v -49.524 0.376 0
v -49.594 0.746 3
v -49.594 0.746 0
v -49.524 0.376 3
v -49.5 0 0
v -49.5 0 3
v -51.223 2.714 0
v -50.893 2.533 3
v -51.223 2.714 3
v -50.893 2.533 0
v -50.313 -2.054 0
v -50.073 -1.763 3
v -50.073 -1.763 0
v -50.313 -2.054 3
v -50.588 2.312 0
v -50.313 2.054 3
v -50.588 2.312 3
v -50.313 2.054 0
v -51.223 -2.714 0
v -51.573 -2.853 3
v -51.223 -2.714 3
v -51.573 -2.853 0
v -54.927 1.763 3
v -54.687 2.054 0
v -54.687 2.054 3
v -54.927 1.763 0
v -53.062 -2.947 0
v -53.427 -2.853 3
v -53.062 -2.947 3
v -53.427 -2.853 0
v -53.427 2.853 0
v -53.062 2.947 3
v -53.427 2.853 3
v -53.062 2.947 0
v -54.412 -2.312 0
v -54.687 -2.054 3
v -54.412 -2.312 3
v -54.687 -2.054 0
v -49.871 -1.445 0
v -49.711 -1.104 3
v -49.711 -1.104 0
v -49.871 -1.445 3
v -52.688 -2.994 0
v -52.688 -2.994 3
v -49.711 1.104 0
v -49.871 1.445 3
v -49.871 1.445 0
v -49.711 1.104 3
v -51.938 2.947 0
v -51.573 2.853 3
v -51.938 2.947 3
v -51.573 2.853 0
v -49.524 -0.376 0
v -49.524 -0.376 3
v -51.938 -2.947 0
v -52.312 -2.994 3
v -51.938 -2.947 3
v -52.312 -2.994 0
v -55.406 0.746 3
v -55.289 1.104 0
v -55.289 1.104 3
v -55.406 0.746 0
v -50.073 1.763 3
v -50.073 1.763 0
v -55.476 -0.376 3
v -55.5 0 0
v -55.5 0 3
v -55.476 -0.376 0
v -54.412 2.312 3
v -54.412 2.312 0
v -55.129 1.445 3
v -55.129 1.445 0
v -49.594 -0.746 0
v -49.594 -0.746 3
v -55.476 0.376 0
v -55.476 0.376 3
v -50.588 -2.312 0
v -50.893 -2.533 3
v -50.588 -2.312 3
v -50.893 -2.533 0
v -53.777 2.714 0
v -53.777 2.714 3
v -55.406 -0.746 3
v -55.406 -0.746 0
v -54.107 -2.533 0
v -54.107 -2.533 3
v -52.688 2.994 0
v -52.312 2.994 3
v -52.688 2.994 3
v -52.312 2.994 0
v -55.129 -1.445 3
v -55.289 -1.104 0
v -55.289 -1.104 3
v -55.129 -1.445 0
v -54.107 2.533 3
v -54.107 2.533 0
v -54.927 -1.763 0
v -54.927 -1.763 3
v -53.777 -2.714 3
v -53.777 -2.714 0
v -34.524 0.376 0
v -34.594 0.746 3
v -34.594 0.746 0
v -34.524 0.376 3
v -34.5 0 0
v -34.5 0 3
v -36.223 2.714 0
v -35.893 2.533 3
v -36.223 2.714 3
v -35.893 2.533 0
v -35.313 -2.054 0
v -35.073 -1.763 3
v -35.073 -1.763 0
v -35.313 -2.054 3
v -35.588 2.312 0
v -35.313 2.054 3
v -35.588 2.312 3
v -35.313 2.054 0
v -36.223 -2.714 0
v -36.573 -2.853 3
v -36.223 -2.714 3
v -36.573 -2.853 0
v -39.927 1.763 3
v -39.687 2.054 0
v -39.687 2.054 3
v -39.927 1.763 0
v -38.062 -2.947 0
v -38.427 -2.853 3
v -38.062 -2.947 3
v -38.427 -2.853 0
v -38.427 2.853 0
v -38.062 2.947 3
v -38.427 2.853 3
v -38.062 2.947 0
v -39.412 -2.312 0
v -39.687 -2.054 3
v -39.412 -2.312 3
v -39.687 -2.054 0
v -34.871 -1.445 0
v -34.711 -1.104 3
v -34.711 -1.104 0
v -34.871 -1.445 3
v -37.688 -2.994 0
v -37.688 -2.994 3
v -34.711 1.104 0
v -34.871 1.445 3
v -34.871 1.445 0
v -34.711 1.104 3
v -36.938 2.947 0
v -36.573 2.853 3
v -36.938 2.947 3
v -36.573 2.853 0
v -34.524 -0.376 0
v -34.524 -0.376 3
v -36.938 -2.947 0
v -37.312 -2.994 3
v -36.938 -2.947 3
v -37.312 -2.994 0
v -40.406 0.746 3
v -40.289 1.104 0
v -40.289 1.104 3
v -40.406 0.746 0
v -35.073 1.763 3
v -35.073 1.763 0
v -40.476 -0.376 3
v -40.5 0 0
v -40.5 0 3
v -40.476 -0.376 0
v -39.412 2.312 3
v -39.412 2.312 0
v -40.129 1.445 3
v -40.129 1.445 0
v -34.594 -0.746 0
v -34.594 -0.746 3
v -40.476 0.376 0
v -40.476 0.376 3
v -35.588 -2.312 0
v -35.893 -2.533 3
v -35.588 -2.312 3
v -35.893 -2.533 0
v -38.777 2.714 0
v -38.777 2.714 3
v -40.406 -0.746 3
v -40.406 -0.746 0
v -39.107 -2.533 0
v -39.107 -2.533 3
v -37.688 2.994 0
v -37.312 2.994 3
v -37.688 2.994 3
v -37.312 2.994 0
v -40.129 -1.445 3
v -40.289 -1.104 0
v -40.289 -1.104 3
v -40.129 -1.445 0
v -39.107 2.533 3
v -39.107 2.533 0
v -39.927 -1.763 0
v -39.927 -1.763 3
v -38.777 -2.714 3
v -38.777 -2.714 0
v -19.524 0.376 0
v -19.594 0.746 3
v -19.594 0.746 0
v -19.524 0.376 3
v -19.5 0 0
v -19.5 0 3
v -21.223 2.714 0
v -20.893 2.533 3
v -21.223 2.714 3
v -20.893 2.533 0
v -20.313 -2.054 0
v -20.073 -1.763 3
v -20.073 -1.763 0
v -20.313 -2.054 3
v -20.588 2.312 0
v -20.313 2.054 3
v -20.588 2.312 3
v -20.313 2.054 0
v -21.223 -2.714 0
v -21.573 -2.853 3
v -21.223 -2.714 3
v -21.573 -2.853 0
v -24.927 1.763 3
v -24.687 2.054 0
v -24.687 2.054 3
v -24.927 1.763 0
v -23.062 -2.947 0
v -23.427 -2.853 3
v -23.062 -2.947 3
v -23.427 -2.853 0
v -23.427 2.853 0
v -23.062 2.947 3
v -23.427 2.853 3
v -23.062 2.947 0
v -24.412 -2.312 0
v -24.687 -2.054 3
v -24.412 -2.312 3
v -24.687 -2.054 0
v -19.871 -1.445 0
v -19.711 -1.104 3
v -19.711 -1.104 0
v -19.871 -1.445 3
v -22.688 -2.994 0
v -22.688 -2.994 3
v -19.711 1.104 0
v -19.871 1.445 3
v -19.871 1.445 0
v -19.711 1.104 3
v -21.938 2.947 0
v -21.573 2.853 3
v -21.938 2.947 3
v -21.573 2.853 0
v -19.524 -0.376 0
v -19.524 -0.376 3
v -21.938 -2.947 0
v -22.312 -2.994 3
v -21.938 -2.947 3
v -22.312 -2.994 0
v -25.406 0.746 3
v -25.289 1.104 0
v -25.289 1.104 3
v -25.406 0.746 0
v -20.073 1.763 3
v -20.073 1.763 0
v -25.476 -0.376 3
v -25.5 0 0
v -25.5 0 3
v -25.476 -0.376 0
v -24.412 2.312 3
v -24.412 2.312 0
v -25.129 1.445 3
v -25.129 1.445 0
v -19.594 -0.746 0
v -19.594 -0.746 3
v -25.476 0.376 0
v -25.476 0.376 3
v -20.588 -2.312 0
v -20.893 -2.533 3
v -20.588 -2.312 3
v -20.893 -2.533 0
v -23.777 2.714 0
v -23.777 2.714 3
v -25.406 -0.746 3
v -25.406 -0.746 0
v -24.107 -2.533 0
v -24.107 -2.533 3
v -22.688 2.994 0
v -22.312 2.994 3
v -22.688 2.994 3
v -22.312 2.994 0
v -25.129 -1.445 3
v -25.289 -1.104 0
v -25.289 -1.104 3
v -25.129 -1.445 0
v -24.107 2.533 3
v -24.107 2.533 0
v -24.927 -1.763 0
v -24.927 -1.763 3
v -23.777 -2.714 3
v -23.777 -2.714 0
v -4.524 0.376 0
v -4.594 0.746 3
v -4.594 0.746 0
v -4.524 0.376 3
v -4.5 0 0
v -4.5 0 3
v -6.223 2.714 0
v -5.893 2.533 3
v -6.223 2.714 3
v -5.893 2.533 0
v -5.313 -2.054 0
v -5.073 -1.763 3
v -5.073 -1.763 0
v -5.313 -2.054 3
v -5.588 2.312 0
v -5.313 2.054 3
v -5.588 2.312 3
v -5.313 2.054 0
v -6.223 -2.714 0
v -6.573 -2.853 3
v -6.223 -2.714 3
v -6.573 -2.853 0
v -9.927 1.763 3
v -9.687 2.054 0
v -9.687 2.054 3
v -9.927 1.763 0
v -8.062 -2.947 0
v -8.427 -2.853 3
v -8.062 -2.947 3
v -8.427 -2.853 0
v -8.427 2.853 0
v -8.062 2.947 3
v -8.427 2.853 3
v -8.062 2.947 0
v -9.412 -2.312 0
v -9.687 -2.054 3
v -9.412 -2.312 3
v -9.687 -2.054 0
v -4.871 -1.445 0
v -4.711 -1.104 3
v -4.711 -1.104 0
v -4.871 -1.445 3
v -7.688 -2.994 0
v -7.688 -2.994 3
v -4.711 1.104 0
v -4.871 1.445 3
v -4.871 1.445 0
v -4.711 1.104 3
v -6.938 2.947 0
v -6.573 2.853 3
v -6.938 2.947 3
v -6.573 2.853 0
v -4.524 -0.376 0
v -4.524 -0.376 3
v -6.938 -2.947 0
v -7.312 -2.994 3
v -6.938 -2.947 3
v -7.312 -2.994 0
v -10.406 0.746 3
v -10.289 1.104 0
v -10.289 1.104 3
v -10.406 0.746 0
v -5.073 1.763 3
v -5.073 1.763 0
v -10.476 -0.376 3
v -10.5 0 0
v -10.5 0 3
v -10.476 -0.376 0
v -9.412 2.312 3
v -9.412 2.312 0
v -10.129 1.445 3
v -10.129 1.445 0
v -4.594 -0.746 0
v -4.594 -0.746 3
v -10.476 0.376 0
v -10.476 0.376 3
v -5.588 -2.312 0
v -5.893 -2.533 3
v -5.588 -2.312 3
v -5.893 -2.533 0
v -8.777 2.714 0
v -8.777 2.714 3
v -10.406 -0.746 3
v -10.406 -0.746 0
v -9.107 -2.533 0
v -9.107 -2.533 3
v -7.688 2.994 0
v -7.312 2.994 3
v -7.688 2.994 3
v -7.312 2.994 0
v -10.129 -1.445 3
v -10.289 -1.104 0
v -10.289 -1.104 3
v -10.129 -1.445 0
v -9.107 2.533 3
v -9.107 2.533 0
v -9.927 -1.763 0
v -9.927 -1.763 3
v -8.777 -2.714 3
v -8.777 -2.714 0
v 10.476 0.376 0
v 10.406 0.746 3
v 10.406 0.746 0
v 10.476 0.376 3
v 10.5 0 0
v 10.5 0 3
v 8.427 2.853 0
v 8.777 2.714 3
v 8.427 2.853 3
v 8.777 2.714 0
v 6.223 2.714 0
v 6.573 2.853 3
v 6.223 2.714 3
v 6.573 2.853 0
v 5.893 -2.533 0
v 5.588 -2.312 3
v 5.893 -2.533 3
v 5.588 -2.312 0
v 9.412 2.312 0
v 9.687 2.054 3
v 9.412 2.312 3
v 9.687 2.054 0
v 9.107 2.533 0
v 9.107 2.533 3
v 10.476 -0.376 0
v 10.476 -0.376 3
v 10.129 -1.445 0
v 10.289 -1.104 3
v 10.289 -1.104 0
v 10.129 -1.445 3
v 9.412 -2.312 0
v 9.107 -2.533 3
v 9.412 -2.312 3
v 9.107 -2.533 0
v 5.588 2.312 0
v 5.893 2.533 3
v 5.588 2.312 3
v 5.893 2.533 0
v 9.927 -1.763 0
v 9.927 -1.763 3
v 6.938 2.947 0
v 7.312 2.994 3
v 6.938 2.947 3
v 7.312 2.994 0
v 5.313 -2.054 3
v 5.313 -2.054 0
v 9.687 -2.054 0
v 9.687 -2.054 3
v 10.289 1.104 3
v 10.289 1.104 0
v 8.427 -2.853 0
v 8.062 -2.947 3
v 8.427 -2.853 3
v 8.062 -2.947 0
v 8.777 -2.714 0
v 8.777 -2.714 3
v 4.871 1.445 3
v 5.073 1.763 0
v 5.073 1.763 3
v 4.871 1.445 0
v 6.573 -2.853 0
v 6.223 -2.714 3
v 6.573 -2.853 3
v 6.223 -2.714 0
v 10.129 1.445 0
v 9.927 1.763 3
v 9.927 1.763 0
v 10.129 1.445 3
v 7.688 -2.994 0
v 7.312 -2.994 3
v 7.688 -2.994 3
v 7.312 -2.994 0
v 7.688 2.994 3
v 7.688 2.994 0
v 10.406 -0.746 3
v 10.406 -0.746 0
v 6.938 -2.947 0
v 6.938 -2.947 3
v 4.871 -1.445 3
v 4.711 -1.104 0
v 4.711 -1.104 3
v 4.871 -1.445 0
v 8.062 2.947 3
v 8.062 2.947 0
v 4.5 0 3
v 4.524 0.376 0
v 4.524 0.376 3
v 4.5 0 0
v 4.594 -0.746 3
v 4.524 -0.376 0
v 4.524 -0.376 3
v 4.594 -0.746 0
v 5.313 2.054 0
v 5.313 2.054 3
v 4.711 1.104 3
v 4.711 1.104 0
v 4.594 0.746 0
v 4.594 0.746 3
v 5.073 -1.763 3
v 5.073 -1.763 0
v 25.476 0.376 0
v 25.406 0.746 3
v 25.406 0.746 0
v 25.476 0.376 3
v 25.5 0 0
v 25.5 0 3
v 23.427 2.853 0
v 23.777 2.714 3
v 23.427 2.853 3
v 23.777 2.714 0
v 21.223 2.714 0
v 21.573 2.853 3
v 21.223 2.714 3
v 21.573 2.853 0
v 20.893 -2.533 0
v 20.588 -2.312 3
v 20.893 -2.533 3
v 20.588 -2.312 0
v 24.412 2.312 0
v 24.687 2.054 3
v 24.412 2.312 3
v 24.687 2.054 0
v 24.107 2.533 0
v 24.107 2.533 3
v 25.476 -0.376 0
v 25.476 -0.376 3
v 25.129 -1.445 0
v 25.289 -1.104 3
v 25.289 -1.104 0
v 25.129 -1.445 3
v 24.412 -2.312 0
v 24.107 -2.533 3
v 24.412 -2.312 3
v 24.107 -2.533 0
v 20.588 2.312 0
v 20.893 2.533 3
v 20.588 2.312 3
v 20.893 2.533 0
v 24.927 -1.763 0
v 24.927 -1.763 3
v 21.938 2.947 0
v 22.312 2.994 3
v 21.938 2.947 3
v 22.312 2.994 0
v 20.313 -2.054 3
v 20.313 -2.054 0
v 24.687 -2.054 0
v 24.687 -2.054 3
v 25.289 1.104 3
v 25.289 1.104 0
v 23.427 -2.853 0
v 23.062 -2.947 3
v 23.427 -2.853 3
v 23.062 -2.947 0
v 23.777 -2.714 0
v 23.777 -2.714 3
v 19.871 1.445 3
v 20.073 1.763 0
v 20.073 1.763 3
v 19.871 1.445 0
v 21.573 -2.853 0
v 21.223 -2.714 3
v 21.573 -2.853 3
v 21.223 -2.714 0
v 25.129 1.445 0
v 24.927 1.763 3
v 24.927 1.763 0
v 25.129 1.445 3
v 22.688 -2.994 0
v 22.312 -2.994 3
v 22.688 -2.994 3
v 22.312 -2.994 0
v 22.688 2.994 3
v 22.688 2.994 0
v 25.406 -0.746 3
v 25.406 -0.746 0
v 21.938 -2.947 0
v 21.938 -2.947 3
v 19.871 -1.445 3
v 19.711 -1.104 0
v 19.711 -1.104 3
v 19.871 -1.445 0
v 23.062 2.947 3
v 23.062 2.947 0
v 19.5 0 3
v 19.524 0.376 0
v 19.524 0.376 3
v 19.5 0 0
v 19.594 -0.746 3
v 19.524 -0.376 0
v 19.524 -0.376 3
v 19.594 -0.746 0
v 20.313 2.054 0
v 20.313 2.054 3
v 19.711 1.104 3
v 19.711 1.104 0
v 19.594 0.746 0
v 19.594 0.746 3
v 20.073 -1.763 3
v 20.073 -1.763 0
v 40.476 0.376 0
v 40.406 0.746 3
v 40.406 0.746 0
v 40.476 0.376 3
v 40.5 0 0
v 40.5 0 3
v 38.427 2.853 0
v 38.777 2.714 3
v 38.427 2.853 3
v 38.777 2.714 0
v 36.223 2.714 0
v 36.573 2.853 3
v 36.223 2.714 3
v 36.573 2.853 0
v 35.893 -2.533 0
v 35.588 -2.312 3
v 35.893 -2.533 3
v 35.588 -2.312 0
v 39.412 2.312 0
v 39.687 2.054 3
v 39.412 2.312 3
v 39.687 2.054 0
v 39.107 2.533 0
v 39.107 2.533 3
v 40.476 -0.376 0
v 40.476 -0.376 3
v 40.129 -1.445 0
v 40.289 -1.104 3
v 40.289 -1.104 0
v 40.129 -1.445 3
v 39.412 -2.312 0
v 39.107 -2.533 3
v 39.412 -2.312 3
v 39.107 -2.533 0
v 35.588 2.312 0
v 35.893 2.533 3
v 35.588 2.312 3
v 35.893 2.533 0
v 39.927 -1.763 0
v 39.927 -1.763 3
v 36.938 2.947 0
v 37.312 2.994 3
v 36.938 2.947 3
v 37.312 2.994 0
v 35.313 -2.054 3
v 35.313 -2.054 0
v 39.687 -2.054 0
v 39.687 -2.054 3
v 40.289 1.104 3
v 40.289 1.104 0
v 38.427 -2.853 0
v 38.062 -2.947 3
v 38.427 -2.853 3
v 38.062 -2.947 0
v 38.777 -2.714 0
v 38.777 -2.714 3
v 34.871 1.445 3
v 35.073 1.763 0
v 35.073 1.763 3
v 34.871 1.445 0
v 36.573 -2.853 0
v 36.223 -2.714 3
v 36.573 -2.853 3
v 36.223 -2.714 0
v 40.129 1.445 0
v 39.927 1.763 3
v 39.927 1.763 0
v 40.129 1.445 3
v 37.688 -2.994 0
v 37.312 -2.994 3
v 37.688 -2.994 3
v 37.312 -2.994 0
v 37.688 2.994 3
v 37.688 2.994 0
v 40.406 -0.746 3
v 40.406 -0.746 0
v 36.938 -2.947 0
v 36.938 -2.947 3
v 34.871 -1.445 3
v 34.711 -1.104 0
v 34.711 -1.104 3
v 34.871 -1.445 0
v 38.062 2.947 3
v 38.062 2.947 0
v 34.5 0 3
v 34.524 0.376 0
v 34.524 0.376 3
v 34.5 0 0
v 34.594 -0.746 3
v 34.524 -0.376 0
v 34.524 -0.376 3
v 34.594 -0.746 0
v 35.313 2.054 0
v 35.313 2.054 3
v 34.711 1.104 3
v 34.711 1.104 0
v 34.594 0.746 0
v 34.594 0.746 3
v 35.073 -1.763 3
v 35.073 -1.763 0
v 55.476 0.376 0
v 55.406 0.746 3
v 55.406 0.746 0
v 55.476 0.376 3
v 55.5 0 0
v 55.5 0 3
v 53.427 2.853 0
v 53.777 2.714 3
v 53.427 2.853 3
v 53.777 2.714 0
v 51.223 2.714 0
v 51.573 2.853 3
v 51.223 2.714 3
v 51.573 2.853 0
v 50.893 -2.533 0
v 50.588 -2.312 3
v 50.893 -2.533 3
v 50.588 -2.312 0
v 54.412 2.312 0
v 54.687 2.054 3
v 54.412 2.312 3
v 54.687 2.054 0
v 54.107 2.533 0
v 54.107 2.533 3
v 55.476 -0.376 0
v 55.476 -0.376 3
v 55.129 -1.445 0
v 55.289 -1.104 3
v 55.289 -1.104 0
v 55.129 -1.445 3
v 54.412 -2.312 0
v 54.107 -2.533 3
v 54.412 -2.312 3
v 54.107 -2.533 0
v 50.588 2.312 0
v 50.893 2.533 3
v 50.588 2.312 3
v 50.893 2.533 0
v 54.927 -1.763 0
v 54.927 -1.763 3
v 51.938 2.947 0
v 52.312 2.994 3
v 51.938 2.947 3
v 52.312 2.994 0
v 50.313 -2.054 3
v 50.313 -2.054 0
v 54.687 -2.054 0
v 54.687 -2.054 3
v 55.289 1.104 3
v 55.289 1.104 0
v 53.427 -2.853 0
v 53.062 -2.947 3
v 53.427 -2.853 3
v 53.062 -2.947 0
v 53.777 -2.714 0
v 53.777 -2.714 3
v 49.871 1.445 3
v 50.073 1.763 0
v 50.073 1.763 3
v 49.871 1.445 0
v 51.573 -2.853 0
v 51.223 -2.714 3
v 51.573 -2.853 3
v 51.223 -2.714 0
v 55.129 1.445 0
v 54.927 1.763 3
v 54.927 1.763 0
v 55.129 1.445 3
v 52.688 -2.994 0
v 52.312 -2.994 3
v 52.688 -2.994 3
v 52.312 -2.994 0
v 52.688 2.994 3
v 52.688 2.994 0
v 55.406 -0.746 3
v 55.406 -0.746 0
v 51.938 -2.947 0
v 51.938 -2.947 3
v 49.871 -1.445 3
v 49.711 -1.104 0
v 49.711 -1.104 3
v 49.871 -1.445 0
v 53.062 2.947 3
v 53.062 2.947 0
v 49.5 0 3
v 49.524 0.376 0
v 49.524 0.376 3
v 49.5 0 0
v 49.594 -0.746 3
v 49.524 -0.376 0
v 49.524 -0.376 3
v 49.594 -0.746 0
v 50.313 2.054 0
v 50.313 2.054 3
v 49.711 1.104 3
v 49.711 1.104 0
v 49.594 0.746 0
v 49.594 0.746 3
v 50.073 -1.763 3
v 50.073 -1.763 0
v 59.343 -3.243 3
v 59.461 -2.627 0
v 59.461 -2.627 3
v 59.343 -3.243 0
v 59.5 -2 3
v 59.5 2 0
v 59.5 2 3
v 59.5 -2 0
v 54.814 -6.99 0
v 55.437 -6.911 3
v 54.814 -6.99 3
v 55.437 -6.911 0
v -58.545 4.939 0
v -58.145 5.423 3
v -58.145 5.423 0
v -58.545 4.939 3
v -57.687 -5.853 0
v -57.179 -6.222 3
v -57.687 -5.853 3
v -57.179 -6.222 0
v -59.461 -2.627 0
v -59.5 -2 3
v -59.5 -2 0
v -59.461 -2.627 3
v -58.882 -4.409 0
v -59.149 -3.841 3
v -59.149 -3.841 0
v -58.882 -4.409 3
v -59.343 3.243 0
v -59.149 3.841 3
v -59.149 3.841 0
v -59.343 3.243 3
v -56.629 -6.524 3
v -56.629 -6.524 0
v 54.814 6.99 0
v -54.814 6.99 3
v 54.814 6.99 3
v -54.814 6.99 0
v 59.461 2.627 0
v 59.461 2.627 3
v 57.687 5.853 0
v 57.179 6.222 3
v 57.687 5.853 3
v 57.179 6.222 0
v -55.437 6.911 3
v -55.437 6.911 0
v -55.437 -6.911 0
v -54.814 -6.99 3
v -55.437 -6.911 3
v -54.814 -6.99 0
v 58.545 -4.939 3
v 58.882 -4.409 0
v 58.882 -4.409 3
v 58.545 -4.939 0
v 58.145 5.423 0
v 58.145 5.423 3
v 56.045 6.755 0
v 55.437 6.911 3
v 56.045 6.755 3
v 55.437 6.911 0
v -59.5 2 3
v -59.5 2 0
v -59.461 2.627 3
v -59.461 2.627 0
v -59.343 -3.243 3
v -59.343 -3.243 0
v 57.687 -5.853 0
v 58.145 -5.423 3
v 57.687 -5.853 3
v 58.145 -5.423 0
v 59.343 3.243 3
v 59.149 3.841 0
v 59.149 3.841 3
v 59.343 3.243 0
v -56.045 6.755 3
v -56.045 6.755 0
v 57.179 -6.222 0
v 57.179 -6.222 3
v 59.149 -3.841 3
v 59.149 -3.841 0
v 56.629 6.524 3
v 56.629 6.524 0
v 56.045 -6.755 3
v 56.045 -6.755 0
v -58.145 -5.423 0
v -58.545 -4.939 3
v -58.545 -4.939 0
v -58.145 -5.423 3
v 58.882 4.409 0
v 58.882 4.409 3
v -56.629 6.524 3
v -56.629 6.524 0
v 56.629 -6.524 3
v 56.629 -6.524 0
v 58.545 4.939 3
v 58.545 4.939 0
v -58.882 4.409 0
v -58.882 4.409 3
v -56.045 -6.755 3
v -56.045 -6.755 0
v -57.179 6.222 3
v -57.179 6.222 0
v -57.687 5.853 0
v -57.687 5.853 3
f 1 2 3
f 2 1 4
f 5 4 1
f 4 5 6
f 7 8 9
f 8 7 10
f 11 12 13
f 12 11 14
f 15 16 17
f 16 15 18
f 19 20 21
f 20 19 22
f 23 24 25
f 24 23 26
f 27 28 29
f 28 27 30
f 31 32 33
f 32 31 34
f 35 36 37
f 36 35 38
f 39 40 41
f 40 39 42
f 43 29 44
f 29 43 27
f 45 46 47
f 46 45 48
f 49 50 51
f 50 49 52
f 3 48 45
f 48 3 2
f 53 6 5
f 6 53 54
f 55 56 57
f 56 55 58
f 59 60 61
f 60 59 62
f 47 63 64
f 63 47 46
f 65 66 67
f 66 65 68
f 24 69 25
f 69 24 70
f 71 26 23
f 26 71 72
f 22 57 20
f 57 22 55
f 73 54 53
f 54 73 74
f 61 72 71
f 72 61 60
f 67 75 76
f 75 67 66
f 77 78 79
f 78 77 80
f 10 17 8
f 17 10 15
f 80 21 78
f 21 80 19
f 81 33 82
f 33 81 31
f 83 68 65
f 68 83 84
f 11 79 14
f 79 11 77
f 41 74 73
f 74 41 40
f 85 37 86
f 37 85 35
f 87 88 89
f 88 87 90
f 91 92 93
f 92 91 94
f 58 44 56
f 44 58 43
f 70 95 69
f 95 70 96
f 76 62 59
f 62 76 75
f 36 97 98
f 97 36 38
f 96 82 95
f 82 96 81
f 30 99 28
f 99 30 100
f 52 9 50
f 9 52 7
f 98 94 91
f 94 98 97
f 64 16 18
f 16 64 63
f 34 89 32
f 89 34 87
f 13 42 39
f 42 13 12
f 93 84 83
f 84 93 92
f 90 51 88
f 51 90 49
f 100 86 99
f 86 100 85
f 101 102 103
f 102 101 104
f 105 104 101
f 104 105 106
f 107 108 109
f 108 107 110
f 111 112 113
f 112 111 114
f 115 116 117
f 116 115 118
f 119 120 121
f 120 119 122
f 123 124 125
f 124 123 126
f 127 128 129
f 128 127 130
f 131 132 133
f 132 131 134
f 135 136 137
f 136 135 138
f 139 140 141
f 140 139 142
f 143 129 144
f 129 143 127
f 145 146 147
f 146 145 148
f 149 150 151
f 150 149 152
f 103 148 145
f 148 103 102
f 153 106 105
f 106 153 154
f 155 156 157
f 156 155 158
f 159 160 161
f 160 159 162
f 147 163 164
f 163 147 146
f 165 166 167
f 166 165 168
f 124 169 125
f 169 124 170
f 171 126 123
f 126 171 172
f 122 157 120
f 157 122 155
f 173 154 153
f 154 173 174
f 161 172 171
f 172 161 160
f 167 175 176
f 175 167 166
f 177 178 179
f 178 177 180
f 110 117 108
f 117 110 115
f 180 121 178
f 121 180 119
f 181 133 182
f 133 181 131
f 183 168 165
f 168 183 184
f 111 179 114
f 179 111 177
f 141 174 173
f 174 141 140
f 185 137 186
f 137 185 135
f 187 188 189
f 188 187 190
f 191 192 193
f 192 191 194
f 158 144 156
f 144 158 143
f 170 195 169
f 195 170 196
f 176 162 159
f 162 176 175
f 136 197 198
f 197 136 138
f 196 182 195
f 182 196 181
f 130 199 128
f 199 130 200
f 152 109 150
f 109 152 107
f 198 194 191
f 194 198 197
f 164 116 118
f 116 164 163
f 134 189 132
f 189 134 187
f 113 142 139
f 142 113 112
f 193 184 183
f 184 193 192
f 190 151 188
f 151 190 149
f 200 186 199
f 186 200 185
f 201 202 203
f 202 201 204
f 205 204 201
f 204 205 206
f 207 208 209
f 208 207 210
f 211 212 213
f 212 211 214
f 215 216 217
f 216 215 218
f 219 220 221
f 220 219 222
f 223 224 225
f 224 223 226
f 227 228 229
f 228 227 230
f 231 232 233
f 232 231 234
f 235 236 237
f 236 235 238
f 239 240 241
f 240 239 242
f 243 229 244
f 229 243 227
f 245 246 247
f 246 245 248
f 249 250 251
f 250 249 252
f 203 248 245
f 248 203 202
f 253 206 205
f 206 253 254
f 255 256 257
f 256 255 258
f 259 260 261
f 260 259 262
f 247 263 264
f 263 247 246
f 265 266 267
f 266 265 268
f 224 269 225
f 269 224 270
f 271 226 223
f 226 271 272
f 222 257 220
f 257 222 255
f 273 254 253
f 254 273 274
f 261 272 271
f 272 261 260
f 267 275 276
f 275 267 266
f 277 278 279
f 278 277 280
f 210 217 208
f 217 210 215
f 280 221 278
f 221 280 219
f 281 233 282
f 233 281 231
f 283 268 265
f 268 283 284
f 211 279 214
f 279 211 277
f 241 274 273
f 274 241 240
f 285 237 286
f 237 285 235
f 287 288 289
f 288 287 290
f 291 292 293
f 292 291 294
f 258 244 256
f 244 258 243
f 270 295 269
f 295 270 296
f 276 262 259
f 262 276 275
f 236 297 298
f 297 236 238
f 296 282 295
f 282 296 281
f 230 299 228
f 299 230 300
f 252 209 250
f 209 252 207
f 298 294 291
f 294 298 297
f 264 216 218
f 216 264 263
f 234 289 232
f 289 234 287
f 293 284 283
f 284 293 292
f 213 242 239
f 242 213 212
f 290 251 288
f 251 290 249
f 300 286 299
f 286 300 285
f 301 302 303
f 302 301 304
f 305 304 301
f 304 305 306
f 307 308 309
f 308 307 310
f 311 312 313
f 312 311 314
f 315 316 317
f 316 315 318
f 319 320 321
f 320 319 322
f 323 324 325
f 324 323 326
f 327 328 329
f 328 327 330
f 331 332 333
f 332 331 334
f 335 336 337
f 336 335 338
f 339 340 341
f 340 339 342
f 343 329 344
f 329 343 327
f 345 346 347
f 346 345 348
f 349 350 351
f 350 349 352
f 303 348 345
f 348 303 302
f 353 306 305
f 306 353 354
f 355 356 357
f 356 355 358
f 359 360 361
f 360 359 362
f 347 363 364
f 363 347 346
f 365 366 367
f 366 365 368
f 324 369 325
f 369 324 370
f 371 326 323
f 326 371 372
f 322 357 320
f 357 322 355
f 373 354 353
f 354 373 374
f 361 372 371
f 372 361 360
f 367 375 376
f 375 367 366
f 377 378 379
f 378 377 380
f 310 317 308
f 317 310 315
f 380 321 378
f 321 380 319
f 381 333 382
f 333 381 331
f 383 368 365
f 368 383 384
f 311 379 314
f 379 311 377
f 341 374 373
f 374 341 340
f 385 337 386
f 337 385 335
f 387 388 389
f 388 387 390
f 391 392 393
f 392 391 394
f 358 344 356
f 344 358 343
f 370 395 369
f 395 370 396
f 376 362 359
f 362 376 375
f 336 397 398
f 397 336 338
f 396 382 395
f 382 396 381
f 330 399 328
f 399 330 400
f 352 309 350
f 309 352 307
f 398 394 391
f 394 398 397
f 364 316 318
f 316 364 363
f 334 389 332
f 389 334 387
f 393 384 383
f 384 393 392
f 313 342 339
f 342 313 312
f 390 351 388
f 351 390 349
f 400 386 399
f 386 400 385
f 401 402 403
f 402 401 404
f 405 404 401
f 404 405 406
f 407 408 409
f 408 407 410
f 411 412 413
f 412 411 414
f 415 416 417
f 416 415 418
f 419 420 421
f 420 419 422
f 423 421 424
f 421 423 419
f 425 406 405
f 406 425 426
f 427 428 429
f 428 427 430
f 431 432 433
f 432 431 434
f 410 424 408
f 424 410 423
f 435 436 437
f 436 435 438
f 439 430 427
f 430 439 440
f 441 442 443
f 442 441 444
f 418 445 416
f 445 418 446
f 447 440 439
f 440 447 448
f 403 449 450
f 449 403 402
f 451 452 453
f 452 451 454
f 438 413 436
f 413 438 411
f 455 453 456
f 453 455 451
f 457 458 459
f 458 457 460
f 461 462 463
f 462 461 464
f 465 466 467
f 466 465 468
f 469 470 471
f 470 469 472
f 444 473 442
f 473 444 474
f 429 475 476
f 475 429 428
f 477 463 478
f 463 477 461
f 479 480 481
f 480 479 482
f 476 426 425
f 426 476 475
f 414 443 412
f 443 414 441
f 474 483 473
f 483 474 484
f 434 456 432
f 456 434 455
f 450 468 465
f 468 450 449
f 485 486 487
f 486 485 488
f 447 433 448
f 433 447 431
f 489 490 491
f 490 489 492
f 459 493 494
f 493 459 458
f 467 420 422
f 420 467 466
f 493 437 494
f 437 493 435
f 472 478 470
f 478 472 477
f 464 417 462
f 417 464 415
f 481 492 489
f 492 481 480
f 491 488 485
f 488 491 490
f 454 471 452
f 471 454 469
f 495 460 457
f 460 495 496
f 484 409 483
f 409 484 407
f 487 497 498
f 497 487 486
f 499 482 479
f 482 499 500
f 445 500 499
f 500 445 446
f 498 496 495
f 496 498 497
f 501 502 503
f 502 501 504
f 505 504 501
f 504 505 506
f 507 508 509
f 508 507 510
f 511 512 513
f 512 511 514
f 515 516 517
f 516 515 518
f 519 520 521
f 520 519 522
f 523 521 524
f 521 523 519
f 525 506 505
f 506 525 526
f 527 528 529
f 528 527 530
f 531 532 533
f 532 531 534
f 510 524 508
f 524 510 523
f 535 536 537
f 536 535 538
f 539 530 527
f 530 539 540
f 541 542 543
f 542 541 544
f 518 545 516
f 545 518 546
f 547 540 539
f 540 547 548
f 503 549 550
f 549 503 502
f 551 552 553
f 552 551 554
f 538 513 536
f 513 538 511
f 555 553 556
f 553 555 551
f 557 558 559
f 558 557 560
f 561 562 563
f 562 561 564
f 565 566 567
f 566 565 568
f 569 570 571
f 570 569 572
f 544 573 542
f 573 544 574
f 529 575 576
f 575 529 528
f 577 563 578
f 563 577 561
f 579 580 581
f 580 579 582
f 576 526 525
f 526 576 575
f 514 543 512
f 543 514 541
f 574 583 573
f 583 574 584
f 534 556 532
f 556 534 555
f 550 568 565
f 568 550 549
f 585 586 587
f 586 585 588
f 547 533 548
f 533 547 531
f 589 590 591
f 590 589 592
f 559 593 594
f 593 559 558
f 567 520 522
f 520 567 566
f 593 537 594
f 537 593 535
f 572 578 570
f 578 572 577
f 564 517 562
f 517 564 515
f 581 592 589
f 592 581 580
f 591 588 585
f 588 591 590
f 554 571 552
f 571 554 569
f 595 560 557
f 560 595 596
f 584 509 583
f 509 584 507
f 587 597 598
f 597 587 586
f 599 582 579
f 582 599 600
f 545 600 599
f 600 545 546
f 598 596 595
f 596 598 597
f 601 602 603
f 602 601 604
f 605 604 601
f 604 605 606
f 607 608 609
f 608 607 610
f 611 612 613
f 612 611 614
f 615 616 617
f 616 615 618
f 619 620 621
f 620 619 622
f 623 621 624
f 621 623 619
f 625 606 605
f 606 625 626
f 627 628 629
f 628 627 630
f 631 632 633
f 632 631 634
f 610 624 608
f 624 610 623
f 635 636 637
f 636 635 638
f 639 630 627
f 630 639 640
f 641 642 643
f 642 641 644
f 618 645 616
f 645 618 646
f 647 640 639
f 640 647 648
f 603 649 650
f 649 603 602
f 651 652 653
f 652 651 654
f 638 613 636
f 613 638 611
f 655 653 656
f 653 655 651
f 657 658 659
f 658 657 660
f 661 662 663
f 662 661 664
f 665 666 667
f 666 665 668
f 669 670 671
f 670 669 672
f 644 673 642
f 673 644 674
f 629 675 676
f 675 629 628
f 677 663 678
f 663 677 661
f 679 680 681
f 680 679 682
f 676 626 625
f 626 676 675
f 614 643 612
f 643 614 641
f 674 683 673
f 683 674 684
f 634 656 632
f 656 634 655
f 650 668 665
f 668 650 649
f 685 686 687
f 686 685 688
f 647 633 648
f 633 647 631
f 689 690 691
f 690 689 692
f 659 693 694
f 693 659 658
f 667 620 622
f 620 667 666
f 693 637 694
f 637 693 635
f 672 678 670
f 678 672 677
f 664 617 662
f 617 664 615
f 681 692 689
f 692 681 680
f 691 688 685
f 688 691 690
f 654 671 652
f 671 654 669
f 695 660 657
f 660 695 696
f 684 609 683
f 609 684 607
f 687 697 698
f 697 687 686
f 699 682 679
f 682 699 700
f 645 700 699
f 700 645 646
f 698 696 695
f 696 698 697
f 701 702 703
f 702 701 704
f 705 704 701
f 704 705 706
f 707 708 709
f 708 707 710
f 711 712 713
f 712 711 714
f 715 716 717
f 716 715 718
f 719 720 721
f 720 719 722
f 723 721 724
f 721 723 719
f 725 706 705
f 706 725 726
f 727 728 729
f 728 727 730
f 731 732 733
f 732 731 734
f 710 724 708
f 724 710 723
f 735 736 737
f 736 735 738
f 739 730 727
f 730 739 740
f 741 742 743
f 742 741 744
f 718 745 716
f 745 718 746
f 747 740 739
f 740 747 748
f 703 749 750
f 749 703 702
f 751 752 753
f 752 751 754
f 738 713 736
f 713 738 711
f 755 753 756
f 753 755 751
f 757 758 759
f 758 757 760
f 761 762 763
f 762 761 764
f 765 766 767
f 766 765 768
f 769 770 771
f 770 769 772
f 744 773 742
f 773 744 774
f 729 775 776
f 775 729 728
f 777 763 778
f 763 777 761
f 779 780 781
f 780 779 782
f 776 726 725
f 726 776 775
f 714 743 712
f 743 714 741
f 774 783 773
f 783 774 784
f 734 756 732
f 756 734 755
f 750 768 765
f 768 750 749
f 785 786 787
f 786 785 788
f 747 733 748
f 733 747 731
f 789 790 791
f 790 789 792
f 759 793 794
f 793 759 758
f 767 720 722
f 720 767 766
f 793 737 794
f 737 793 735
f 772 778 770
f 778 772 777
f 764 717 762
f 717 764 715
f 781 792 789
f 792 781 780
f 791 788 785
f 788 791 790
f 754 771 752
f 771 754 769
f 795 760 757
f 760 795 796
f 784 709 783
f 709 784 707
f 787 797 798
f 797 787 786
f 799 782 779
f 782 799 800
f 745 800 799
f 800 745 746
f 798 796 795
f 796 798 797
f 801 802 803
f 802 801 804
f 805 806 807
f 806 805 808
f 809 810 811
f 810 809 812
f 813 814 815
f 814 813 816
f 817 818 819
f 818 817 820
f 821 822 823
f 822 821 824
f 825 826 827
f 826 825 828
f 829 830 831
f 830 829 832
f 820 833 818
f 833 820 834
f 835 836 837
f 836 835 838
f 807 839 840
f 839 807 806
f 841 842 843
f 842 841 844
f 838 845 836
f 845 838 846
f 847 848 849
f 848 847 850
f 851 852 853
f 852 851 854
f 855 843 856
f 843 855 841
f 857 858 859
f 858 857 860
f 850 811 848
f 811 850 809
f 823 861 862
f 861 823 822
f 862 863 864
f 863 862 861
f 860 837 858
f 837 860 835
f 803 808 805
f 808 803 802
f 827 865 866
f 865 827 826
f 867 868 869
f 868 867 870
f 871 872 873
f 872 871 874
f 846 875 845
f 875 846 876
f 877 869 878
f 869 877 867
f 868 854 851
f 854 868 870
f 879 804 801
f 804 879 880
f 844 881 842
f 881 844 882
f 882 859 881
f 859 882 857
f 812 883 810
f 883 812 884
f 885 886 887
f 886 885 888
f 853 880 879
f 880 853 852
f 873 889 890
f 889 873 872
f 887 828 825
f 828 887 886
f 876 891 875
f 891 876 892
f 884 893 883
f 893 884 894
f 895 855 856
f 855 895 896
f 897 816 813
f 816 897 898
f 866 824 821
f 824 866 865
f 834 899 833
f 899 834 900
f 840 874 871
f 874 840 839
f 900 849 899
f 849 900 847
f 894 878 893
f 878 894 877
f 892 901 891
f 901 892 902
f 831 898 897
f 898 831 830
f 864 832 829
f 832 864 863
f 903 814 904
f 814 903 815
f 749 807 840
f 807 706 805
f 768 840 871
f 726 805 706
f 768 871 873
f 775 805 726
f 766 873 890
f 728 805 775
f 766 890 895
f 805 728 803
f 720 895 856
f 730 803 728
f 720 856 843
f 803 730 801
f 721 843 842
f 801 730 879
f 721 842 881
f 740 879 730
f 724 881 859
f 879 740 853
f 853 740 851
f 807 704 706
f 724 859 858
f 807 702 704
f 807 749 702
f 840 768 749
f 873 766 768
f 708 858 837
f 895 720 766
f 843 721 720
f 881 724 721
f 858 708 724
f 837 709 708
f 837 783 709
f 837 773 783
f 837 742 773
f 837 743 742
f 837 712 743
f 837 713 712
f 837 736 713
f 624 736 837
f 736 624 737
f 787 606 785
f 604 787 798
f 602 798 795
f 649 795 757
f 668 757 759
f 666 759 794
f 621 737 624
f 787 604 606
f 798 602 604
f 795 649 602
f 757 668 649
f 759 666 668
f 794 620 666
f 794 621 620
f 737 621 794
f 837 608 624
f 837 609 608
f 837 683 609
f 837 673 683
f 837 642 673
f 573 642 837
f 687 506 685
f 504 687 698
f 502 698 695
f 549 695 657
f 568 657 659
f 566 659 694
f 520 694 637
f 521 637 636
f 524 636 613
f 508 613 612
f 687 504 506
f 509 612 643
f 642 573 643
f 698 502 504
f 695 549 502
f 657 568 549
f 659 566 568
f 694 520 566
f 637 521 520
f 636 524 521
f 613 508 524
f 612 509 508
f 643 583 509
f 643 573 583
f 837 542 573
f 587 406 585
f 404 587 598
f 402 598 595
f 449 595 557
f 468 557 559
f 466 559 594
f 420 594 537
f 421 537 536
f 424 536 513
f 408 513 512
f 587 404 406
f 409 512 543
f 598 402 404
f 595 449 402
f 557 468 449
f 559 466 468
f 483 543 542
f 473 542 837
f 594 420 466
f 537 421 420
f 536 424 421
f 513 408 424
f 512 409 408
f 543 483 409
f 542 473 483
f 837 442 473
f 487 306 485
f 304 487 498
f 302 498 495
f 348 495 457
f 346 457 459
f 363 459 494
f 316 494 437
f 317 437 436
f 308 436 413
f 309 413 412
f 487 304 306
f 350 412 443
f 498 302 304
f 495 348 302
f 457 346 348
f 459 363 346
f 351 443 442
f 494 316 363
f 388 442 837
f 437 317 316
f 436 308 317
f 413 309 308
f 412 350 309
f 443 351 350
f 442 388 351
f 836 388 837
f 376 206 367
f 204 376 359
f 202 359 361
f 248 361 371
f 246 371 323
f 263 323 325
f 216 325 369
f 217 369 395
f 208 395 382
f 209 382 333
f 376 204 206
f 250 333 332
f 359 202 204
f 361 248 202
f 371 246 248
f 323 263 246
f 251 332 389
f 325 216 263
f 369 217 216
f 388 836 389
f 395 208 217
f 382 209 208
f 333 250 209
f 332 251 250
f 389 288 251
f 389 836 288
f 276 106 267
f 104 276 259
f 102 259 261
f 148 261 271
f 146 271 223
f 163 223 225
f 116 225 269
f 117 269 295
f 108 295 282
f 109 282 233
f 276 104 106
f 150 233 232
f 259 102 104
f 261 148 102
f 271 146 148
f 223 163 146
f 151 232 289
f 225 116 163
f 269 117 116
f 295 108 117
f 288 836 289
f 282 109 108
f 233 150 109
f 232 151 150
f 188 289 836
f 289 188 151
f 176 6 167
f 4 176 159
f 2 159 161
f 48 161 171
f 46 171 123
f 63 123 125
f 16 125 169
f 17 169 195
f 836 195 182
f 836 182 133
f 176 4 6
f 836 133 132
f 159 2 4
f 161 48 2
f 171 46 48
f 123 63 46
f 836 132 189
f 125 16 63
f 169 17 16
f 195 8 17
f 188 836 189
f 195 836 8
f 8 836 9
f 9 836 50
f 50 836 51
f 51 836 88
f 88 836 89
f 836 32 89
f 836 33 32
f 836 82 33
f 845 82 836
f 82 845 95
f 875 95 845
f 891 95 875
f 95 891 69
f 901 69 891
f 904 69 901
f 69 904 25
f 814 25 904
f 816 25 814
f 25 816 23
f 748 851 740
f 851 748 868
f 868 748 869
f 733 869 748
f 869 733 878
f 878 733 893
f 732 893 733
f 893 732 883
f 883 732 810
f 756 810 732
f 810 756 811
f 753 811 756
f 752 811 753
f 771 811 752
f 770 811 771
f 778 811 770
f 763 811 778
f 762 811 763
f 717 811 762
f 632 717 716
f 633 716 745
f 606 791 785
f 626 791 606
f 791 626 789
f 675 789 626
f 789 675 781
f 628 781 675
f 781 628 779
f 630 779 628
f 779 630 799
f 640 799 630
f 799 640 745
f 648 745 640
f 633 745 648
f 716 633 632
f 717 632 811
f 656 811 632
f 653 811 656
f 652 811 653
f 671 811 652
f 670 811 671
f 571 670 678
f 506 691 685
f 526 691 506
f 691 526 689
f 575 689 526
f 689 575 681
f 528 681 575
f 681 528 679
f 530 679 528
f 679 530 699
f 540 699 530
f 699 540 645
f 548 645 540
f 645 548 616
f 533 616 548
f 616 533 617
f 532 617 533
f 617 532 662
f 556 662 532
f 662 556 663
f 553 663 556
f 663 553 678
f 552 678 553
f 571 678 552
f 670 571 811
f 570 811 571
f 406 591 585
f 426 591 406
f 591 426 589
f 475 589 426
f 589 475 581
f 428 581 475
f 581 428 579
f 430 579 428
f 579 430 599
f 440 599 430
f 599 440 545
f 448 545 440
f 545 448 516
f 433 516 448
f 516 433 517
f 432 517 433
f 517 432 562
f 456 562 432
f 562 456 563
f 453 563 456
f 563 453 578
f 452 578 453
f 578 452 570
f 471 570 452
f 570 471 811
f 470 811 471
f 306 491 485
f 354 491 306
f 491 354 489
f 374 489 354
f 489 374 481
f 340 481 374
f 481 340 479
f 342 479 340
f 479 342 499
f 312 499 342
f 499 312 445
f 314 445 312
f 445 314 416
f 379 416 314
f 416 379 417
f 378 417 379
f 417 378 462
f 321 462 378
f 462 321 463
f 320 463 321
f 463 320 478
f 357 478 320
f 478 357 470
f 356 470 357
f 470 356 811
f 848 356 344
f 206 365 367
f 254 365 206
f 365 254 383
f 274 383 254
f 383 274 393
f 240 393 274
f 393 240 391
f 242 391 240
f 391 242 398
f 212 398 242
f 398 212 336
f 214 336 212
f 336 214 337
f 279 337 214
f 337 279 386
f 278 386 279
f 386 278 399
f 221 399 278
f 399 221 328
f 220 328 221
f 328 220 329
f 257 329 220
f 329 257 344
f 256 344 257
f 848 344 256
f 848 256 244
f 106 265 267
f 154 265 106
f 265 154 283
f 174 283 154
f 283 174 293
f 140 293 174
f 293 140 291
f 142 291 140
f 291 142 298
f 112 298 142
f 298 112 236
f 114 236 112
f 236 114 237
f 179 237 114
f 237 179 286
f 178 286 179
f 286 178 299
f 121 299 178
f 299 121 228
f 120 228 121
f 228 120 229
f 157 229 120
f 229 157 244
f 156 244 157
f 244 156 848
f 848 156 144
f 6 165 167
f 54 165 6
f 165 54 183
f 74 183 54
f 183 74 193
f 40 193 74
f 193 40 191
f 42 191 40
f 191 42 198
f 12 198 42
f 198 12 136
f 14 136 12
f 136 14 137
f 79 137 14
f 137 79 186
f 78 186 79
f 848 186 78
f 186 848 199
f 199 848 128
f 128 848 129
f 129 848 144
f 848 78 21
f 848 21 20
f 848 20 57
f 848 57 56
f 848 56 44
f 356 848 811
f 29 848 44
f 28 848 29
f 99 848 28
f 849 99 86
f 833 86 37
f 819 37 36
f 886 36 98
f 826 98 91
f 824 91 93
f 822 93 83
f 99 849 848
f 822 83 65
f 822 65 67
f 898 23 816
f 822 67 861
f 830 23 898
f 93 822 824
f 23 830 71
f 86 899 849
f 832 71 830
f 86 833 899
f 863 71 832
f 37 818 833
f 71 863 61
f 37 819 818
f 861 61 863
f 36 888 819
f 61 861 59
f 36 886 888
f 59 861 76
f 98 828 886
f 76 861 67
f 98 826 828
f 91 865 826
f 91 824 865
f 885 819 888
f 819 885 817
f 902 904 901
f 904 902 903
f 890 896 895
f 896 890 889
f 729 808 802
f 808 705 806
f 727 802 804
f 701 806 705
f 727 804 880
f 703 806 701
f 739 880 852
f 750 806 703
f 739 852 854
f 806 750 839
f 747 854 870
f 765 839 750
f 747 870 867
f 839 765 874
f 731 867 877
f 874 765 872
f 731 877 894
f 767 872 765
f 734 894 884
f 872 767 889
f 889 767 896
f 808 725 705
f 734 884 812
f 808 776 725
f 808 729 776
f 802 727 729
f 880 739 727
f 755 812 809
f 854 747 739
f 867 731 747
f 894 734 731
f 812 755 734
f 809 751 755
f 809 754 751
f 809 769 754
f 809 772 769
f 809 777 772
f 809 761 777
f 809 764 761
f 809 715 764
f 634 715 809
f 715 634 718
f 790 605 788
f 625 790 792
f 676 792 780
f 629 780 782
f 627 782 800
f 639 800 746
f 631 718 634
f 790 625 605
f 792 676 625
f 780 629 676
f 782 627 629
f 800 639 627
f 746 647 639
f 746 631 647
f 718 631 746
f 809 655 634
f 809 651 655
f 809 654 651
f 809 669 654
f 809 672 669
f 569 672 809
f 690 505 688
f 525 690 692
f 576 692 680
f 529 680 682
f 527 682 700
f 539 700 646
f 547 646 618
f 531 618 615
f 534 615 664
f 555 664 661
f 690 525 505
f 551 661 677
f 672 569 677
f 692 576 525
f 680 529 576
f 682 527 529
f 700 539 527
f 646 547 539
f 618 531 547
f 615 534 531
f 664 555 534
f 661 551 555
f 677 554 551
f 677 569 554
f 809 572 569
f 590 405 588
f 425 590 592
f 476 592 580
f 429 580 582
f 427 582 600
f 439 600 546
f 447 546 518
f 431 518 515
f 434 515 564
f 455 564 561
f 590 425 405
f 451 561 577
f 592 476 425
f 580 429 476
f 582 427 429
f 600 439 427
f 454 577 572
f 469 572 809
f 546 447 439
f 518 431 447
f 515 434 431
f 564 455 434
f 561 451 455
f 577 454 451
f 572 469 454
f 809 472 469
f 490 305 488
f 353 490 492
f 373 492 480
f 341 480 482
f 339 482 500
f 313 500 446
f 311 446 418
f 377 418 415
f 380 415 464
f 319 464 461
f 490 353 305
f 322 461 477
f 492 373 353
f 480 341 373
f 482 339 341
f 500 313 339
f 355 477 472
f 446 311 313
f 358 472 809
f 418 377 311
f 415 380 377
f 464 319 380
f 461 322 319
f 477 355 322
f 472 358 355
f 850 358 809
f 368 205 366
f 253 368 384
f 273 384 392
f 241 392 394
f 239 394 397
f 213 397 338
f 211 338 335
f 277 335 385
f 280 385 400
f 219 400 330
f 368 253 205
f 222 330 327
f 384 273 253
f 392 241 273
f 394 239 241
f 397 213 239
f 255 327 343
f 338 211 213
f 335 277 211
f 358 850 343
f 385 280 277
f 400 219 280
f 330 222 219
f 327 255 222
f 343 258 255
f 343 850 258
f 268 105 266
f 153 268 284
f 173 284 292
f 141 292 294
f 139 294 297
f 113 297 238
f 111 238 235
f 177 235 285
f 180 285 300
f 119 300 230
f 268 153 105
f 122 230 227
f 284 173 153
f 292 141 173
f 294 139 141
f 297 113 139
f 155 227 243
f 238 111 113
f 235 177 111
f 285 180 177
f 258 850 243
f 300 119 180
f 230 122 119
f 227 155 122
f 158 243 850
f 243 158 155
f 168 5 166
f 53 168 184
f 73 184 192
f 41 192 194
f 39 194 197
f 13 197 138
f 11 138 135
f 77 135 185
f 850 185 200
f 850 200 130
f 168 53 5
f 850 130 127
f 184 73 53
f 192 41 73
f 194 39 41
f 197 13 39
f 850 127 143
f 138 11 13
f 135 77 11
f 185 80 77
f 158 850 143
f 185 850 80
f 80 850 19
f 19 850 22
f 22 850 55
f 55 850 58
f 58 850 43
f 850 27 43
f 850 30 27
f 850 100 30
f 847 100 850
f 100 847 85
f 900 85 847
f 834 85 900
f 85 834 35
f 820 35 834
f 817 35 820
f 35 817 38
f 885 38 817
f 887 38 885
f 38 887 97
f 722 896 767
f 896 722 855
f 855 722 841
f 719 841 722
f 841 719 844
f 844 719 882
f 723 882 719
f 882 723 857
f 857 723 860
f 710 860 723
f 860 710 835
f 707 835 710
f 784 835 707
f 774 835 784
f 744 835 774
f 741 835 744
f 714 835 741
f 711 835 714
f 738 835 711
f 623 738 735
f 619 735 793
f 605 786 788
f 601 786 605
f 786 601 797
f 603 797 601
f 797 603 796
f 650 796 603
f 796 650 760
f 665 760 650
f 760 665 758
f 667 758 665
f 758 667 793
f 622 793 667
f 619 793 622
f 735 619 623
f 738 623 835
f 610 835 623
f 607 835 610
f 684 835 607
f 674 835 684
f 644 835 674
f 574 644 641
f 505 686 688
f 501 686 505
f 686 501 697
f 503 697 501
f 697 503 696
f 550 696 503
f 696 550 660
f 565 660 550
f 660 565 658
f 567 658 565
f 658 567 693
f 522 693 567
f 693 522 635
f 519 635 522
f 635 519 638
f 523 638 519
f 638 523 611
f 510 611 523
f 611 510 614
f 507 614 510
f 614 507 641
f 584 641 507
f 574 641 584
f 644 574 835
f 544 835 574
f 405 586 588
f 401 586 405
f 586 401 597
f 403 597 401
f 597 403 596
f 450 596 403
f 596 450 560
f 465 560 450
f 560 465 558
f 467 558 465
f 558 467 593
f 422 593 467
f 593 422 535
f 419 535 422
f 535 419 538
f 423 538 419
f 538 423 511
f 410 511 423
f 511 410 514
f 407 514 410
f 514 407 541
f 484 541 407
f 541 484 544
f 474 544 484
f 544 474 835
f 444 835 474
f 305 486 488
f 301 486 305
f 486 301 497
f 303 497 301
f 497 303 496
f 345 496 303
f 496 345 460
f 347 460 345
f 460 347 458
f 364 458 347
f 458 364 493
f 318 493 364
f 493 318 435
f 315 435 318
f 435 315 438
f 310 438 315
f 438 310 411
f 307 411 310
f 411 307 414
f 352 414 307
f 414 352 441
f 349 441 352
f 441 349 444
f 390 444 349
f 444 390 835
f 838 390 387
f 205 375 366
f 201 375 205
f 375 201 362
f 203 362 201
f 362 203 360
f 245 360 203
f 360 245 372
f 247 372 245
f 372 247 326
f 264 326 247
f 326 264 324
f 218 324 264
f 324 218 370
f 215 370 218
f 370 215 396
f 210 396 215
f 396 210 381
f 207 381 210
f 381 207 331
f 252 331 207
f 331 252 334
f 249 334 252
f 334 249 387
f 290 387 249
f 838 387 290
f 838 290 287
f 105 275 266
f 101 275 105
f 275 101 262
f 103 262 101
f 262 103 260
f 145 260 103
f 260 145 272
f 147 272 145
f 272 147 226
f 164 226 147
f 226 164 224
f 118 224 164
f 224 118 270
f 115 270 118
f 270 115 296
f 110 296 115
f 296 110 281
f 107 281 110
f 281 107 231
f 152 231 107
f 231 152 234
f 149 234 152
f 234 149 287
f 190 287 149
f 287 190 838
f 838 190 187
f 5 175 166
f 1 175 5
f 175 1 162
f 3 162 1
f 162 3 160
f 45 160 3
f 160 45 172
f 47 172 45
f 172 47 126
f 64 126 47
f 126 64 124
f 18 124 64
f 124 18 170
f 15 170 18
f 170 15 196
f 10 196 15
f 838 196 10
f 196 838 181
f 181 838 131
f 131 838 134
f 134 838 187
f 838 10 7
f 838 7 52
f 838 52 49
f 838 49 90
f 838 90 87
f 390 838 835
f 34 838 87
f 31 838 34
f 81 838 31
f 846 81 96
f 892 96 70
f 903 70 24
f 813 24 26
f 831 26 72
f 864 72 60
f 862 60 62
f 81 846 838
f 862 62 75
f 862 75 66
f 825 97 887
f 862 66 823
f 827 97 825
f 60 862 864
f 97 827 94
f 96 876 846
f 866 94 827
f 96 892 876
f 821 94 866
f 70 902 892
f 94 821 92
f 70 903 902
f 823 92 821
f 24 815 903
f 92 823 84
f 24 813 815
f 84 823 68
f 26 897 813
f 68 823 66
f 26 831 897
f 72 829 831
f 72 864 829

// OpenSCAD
$fn = 50;


difference() {
	union() {
		hull() {
			translate(v = [-54.5000000000, 2.0000000000, 0]) {
				cylinder(h = 3, r = 5);
			}
			translate(v = [54.5000000000, 2.0000000000, 0]) {
				cylinder(h = 3, r = 5);
			}
			translate(v = [-54.5000000000, -2.0000000000, 0]) {
				cylinder(h = 3, r = 5);
			}
			translate(v = [54.5000000000, -2.0000000000, 0]) {
				cylinder(h = 3, r = 5);
			}
		}
	}
	union() {
		translate(v = [-52.5000000000, 0.0000000000, 0]) {
			translate(v = [0, 0, -100]) {
				cylinder(h = 200, r = 3.0000000000);
			}
		}
		translate(v = [-37.5000000000, 0.0000000000, 0]) {
			translate(v = [0, 0, -100]) {
				cylinder(h = 200, r = 3.0000000000);
			}
		}
		translate(v = [-22.5000000000, 0.0000000000, 0]) {
			translate(v = [0, 0, -100]) {
				cylinder(h = 200, r = 3.0000000000);
			}
		}
		translate(v = [-7.5000000000, 0.0000000000, 0]) {
			translate(v = [0, 0, -100]) {
				cylinder(h = 200, r = 3.0000000000);
			}
		}
		translate(v = [7.5000000000, 0.0000000000, 0]) {
			translate(v = [0, 0, -100]) {
				cylinder(h = 200, r = 3.0000000000);
			}
		}
		translate(v = [22.5000000000, 0.0000000000, 0]) {
			translate(v = [0, 0, -100]) {
				cylinder(h = 200, r = 3.0000000000);
			}
		}
		translate(v = [37.5000000000, 0.0000000000, 0]) {
			translate(v = [0, 0, -100]) {
				cylinder(h = 200, r = 3.0000000000);
			}
		}
		translate(v = [52.5000000000, 0.0000000000, 0]) {
			translate(v = [0, 0, -100]) {
				cylinder(h = 200, r = 3.0000000000);
			}
		}
	}
}
